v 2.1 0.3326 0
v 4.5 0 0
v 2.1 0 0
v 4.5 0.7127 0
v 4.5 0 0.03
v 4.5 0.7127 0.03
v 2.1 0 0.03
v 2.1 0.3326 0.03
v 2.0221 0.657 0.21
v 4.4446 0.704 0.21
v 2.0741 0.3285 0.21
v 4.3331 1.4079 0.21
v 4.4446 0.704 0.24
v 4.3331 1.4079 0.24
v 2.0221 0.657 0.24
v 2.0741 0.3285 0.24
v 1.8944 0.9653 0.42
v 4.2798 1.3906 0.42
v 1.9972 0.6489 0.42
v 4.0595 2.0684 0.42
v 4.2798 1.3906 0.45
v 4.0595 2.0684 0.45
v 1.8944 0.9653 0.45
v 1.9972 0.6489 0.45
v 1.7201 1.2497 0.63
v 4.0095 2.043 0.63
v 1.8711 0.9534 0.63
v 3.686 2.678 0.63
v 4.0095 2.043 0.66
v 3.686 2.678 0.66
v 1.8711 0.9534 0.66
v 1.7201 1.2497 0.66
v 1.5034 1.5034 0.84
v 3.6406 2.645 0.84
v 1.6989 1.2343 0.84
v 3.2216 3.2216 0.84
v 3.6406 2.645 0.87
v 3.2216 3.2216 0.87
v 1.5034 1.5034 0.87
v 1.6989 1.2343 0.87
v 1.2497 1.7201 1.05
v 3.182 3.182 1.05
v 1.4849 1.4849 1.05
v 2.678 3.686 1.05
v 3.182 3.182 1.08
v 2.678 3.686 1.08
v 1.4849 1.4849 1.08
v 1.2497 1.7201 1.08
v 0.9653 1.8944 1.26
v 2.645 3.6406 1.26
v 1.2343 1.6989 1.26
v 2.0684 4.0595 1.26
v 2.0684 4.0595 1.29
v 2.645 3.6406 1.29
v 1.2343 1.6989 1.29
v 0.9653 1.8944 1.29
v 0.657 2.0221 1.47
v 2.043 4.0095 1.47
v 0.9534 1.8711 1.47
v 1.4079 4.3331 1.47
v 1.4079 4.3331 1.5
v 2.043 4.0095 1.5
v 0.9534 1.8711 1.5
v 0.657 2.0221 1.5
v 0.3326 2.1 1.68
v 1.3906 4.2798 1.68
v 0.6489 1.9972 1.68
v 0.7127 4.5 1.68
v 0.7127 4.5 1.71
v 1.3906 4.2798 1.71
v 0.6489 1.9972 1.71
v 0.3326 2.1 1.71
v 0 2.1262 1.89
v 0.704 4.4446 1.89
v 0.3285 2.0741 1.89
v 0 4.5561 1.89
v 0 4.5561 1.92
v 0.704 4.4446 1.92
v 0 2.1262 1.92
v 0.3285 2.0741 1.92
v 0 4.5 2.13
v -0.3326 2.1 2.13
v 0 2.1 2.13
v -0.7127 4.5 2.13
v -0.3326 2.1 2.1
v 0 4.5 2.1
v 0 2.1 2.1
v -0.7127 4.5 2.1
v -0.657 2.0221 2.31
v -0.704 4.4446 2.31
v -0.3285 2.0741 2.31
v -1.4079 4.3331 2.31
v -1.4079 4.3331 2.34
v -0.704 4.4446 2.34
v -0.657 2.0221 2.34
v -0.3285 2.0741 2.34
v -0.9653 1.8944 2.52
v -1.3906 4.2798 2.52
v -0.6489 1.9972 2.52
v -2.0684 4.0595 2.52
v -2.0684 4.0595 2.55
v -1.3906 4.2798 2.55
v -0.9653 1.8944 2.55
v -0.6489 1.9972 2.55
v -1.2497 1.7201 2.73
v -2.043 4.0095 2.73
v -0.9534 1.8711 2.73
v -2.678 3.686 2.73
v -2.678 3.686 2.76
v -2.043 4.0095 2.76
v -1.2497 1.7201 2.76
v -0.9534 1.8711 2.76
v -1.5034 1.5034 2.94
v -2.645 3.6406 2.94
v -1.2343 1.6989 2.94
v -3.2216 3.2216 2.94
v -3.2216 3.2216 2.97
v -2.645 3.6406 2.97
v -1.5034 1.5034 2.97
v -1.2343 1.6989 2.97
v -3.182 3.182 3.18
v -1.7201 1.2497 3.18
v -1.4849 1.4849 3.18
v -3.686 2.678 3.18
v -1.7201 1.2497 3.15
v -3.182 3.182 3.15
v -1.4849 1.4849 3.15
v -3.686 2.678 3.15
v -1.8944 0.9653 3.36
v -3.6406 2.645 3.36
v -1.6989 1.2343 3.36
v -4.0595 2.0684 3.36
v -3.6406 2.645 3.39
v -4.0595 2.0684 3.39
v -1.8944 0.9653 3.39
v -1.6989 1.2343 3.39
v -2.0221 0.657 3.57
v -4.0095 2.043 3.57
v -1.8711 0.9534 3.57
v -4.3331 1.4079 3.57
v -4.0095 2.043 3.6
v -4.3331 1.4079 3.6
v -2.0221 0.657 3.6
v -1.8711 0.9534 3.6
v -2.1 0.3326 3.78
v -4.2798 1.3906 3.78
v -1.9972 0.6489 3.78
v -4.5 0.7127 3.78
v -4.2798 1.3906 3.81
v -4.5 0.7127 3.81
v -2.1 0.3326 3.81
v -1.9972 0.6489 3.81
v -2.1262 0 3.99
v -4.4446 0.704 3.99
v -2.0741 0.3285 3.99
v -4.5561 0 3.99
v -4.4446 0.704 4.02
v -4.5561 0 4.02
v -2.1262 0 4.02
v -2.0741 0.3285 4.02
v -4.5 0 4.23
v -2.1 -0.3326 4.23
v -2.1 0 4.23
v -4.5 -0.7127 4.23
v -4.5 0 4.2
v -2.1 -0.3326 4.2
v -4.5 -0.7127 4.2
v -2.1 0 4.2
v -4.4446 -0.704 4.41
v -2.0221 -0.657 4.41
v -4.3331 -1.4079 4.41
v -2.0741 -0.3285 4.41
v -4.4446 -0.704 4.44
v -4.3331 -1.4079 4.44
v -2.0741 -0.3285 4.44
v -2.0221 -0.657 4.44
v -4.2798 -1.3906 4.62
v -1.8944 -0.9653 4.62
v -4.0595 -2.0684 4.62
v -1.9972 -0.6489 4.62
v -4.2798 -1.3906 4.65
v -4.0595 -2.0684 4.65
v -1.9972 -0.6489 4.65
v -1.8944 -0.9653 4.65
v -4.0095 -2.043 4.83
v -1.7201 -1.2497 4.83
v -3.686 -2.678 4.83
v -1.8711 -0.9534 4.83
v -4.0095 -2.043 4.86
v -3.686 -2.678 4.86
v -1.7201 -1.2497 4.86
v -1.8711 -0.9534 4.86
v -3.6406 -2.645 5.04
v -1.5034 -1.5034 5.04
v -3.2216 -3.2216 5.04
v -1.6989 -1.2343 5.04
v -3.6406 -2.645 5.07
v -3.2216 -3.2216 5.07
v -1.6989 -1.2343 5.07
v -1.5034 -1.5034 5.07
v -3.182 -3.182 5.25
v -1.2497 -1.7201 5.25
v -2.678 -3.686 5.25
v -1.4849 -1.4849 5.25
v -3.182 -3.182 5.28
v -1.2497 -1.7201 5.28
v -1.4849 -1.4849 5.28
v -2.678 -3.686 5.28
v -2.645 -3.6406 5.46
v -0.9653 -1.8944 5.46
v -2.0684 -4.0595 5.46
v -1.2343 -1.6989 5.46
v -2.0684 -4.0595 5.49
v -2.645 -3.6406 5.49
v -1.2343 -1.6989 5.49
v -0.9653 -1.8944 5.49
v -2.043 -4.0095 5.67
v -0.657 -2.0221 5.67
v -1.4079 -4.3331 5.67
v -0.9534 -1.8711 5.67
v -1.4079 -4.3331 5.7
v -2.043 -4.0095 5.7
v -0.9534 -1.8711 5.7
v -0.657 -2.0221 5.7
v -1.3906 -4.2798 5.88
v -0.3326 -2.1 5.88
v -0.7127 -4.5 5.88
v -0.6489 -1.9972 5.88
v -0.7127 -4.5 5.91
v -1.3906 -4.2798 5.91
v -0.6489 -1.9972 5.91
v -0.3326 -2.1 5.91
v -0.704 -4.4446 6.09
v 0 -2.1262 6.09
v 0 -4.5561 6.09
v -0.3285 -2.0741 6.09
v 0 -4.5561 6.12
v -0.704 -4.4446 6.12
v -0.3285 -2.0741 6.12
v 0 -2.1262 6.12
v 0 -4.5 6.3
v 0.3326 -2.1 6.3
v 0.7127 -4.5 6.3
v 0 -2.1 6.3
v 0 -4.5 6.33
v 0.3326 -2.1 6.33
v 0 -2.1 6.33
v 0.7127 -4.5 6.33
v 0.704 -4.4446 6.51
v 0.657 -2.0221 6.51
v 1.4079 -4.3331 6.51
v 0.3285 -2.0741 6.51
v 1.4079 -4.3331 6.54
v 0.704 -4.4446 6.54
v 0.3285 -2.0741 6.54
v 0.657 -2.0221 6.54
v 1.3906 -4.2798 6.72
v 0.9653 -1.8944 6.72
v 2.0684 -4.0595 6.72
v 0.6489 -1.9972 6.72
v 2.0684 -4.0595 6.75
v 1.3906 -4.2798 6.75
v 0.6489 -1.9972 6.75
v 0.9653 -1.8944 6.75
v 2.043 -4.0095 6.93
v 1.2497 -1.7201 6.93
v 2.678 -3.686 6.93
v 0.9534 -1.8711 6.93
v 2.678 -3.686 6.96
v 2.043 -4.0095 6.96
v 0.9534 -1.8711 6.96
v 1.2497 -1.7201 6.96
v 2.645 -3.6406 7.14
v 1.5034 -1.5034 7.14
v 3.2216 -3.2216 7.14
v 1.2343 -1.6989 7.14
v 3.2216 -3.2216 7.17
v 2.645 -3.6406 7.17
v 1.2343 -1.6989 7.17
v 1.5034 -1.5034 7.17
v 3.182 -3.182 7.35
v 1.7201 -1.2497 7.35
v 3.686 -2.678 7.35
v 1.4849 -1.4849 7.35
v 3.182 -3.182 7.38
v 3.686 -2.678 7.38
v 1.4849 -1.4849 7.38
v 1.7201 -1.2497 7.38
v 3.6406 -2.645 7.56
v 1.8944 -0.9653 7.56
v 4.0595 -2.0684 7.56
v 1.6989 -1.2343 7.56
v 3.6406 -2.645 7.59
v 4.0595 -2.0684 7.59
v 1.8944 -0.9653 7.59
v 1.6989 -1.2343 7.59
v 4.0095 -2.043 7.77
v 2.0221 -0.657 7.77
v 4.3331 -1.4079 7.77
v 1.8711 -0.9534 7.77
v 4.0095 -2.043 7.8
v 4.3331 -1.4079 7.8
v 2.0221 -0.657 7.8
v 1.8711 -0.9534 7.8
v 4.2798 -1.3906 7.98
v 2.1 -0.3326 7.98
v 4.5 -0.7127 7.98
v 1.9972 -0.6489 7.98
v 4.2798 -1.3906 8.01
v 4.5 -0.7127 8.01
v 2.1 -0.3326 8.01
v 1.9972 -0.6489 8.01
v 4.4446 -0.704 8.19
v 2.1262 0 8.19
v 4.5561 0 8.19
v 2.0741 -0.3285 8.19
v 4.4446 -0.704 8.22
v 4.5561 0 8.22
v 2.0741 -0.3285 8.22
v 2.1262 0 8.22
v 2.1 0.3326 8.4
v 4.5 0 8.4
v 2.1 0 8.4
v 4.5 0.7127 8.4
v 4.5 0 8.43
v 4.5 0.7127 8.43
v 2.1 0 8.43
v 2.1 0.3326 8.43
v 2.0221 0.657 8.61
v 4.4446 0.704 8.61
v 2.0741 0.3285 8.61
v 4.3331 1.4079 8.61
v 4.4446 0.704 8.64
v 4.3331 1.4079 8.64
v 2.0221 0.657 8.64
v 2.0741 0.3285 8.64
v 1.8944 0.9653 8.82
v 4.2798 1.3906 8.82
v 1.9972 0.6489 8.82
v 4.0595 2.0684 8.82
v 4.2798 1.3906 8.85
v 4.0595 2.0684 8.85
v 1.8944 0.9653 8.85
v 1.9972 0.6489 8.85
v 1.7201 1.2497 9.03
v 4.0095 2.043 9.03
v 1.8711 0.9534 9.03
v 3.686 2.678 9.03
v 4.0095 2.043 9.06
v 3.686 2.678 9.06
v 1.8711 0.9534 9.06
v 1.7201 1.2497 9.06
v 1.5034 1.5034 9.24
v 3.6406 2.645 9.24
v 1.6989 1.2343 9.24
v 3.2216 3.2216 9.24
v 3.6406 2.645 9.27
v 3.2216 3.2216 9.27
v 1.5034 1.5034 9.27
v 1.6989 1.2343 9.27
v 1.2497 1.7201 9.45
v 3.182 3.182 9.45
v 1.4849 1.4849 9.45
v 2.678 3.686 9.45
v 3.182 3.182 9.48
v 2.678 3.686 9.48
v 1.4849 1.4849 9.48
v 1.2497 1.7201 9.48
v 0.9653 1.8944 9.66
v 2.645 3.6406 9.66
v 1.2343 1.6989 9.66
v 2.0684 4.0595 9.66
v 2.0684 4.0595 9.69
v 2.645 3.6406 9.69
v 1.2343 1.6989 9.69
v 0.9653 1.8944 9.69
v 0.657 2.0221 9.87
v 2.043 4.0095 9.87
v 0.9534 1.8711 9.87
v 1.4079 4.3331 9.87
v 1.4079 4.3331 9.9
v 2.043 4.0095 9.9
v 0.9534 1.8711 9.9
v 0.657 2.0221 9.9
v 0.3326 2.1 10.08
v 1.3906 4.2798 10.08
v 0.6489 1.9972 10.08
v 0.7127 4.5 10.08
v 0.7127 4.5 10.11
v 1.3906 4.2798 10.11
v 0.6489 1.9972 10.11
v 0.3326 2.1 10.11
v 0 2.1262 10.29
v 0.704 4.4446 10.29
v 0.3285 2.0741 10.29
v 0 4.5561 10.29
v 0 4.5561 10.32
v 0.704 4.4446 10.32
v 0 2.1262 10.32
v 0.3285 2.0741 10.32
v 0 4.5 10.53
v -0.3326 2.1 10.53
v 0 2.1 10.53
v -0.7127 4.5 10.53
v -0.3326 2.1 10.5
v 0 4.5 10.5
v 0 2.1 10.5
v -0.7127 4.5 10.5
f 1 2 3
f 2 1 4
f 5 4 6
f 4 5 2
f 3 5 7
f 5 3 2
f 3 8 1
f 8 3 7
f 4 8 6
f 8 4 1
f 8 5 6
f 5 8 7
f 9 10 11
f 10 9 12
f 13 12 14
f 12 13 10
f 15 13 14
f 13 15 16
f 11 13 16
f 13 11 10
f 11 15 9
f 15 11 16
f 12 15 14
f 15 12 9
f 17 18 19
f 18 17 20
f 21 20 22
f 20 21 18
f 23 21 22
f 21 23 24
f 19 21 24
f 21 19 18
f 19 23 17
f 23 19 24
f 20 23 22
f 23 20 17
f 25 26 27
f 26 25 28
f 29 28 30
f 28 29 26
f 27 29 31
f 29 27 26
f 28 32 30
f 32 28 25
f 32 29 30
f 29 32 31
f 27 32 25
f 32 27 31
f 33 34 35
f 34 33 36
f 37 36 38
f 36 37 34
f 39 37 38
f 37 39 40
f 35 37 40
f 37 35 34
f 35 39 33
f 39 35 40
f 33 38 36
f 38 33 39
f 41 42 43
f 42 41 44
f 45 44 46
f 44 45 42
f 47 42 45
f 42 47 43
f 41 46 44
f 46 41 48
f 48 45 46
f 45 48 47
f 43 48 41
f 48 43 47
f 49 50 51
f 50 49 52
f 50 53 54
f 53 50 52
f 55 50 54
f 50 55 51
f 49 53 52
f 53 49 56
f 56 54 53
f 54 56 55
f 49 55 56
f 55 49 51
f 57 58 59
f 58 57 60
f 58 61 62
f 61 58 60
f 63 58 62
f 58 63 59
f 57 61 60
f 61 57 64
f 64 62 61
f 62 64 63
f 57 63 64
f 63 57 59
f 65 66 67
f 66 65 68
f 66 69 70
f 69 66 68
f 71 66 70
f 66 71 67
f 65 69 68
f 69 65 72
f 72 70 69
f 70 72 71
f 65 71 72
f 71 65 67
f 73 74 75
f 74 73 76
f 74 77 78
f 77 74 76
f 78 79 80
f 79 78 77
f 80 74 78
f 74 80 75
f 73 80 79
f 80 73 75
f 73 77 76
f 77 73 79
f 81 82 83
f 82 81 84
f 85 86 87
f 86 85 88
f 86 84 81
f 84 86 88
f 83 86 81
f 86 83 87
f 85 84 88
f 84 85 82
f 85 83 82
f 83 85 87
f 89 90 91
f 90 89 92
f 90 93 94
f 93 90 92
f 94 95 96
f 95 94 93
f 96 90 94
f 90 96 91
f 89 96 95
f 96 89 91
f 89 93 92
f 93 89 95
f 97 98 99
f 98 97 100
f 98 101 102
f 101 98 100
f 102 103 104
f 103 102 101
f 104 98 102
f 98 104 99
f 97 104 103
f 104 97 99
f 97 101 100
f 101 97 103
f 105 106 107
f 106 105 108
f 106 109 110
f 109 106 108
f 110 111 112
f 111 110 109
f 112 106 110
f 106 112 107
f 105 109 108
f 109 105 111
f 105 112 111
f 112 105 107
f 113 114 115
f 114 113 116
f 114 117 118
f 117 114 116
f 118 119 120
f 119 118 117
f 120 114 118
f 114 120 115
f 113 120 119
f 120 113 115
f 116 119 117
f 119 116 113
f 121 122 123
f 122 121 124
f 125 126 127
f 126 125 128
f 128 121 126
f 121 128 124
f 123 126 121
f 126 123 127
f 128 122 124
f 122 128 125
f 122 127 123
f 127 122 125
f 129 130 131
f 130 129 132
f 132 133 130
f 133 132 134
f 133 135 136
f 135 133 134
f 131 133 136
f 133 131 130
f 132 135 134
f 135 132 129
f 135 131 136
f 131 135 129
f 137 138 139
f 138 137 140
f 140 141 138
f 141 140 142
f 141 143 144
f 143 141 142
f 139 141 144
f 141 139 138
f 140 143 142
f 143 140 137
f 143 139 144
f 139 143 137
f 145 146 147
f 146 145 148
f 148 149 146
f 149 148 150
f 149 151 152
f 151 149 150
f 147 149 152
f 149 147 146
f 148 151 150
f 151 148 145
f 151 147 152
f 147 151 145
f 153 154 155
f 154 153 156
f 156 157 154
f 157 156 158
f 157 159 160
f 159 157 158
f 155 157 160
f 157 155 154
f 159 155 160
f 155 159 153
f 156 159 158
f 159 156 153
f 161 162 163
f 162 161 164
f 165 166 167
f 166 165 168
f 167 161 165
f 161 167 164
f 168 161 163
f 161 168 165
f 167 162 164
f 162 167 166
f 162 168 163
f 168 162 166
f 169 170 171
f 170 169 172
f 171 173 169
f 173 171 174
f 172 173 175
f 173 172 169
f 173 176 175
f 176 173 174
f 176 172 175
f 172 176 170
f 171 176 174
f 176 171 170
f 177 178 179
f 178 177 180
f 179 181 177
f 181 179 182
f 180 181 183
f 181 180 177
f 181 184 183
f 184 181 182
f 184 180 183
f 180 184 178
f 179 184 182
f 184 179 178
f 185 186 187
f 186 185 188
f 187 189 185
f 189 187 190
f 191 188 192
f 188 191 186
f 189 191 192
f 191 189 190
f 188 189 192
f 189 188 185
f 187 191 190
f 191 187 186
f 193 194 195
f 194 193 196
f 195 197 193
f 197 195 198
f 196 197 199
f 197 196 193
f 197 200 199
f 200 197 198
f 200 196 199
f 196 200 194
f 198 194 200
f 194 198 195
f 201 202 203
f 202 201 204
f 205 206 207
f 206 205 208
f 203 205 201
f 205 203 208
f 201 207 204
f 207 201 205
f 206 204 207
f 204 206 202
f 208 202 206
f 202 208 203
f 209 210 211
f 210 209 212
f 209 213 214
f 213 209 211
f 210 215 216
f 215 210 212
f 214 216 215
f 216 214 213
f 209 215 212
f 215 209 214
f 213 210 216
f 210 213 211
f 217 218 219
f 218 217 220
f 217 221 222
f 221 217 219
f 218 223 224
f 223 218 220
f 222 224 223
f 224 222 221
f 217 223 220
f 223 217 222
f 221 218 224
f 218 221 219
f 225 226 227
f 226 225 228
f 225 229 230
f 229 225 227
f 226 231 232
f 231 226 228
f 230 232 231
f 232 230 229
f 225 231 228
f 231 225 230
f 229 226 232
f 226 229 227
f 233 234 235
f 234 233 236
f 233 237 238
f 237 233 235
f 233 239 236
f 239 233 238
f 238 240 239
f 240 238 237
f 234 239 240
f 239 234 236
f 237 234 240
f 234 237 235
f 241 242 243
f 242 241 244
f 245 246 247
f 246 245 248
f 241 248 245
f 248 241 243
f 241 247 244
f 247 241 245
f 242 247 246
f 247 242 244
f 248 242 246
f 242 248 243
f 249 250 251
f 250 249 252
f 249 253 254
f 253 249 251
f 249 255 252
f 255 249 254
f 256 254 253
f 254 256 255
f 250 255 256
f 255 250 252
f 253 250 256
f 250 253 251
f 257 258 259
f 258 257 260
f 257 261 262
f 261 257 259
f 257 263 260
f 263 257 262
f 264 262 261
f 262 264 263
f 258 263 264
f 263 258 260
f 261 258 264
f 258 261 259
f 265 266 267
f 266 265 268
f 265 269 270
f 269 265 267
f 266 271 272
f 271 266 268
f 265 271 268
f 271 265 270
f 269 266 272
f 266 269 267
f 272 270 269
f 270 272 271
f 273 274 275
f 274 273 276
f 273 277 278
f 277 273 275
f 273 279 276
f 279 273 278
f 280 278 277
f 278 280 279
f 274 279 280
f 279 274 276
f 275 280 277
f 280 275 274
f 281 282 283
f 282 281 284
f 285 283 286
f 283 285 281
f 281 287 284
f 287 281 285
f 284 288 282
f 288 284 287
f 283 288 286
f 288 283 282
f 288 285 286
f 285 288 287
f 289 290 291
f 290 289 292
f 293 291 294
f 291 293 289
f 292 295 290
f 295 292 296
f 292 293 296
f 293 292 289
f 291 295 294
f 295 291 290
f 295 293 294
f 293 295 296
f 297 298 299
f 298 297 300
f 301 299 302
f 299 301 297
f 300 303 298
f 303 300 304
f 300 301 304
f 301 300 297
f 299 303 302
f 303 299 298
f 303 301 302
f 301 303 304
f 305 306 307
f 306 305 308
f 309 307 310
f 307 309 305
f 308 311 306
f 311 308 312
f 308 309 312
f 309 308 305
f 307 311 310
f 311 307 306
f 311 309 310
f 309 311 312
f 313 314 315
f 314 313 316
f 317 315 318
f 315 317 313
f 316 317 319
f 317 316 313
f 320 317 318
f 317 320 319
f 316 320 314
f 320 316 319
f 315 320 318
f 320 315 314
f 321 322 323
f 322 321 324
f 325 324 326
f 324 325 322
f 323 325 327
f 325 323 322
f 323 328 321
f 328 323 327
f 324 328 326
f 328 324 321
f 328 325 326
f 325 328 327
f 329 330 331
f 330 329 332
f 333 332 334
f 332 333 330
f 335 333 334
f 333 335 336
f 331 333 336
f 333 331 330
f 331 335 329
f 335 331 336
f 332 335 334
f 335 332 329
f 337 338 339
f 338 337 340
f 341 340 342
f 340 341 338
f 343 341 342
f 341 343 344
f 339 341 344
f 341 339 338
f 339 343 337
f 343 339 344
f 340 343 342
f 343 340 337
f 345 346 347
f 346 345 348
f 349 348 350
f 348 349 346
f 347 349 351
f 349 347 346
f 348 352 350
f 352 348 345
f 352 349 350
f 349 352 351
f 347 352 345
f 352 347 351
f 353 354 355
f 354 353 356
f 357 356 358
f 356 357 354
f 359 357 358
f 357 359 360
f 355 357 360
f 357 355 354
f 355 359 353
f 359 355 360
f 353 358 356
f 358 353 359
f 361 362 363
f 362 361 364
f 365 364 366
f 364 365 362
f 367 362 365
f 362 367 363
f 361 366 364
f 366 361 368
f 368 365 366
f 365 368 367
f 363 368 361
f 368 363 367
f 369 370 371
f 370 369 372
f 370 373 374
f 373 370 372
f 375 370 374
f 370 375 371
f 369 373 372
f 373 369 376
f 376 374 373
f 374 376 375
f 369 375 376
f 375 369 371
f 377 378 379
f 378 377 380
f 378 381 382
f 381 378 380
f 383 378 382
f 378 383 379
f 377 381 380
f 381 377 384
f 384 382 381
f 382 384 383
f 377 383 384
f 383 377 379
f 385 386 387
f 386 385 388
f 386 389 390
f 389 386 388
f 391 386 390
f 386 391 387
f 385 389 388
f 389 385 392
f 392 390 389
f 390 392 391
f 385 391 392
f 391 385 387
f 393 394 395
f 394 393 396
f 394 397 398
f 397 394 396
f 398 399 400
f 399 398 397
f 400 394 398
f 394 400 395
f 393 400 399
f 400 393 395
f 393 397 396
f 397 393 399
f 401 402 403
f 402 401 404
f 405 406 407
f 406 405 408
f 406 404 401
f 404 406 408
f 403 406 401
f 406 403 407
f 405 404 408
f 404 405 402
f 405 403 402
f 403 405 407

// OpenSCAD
include <affine.scad>

//// Module constructed from affine aRpp to rotate about line through two points.
module rotatepp(angle,p1,p2)
{
    arot = aRpp(angle,p1,p2);
    apply(arot) children();
}

//// Module constructed from affine aMpp to mirror about plane
//// everywhere orthogonal to vector p2-p1 through p1.
module mirrorpp(p1,p2)
{
    amirror = aMpp(p1,p2);
    apply(amirror) children();
}

////Builds one step of a stair for test1
module stair(depth,incAngle,rin,rout)
{
   cas = tan(incAngle);
   linear_extrude(height=depth){ polygon([[rin,0],[rin,cas*rin],[rout,cas*rout],[rout,0]]); }
}

//// Set only one test to true or get ugly results
test1=true;
test2=false;
test3=false;
test4=false;
test5=false;

//// Some values for tests
origin = [0,0,0];
v1 = [1,1,1];
v2 = [2,2,2];
v3 = [0,0,3];
v11=[-4,2,7];
v22=[-1,-3,-1];


if(test1)
{
//// TEST1 affine power.  affine times affine
   //// Stair case   
   rin = 2.1;
   rout = 4.5;
   depth = .03;
   rise = .21;
   totalAngle = 450;
   numberStairs = 50;
   incAngle=totalAngle/numberStairs;
   totalAffine = aXa(aS(off=[0,0,rise]),aRv(-incAngle,[0,0,1]));
   for(i=[0:numberStairs])
   {
     apply(aPow(totalAffine,i)) stair(depth,incAngle,rin,rout);
   }  
}   


if(test2)
{
//// TEST 2.  Print out 4 rotations.  Last should be equal to first (its close!)
rot = aRpp(90,v3,v2);
echo([rot,aPow(rot,1),aPow(rot,2),aPow(rot,3),aPow(rot,4)]);
}
   
if(test3)
{    
   //// This shows that the modules above for rotate and mirror work
   ///Draw cylinder through v3, v2 to show axis of rotation.
    hull() {translate(v2) sphere(.2); translate(v3) sphere(.2);}

   ///Draw rect solid
   cube([.5,2,3]);
   /// Draw rotated solid about v2,v3
   rotatepp(165,v3,v2) cube([.5,2,3]);
   /// Draw mirrored on plane through v3
   mirrorpp(v3,v2) rotatepp(165,v3,v2)  cube([.5,2,3]);
}

if(test4)
{
   //// Generates the same as the above using affines directly
   ///Draw cylinder through v3, v2 to show axis of rotation.
    hull() {translate(v2) sphere(.2); translate(v3) sphere(.2);}

   ///Affine to rotate as above
   rot = aRpp(165,v3,v2);
   //Affine to mirror as above
   mir = aMpp(v3,v2);
   ///combined mirror rotate
   mrt = aXa(mir,rot); //really wish we overloaded '*' here

   cube([.5,2,3]);
   apply(rot) cube([.5,2,3]);
   apply(mrt) cube([.5,2,3]); //We used a cube to distinguish from solid.
}

if(test5)
{
///////////////// Miscelaneous test data from original debugs
///////////////// Both printed and displayed.    
   echo("\n  TEST VARIABLES "); 
   testM3 = [[2,3,4],[-2,5,7],[.1,-3,6]];
   testM2 = [[2,3],[-2,5]];
   testV = [-1,2,-3];
   echo("testM3 = [[2,3,4],[-2,5,7],[.1,-3,6]];");
   echo("testM2 = [[2,3],[-2,5]];"); 
   echo("testV = [-1,2,-3];");  
    
   echo("\n  TEST 22 matrix inverses");
   echo("mI(testM2) =", mI(testM2)); 
   echo("mI(testM3) =", mI(testM3));
   echo("testM3 * mI(testM3) =", testM3 * mI(testM3)); 
    
   echo("\n  TEST 4444 matrix transpose"); 
   echo("mT(testM2) =",mT(testM2));
   echo("mT(testM3) =",mT(testM3));
   
   echo("\n  MORE TEST VARIABLES "); 
   testM4 = [[2,3,4,-1],[-2,5,7,2],[.1,-3,6,0],[0,0,0,1]];
   echo("testM4 = [[2,3,4,-1],[-2,5,7,2],[.1,-3,6,0,-3],[0,0,0,1]];");
   
   echo("\n  55555 affine form from transform matrix and back");
   echo("aDm(testM4) =",aDm(testM4));
   echo("mDa(aDm(testM4)) =",mDa(aDm(testM4)));
   echo("aDm(testM4) =",aDm(testM4));
   echo("mDa(aDm(testM4)) =",mDa(aDm(testM4)));
   
   echo("\n  666666 affine times a vector");
   echo("aXv(aDm(testM4),testV) =",aXv(aDm(testM4),testV));
   echo("aXv(aDm(testM4),testV) =",aXv(aDm(testM4),testV));
   
   echo("\n  7777777 affine inverse returns original vector");
   echo("aXv(aI(aDm(testM4),testV),aXv(aDm(testM4),testV)) =",
         aXv(aI(aDm(testM4),testV),aXv(aDm(testM4),testV)));
   echo("aXv(aI(aDm(testM4),testV),aXv(aDm(testM4),testV)) =",
         aXv(aI(aDm(testM4),testV),aXv(aDm(testM4),testV)));  
     
   echo("\n  88888888 affine generator functions");
   echo("arxy(45) =", arxy(45));
   echo("aDpppp([[1,5,1],[0,.5,2],[2,1,2]],[1,1,1]) =",
         aDpppp([[1,5,1],[0,.5,2],[2,1,2]],[1,1,1]));
   echo("aRv(90,[1,1,3]) =", aRv(90,[1,1,3]));      
        
 
   echo("\n\n\n");

//// test aRpp
$fn=31;
angle=190;
twi = 125;

hull()
{translate(v11) sphere(.2); translate(v22) sphere(.2);}

//translate(-v11) hull()
//{translate(v11) sphere(.2); translate(v22) sphere(.2);}

myrot = aRpp(angle,v11,v22);

for( i=[0:60:angle] )
{  
apply (aMpp(v11,v22))    
apply(aRpp(i,v11,v22)) translate([0,1,4])
   linear_extrude(height=3,center=true, twist=twi)
   { polygon([[0,0],[0,1],[4,0]]); }
   
 apply(aRpp(i,v11,v22)) translate([0,1,4])
   linear_extrude(height=3,center=true, twist=twi)
   { polygon([[0,0],[0,1],[4,0]]); }  
}
translate([0,1,4]) linear_extrude(height=3,center=true, twist=twi)
  { polygon([[0,0],[0,1],[4,0]]); }
  
  
} 

/*
Observations::
We can multiply any number of affines together to get a new affine.
Applying these to a shape is more efficient that using multiple transforms from
modules.

An affine moves us from one coordinate system to another, as do the built in
transformations,  The new coordinate system can be rotated, mirrored or distorted both
angularly and stretched on any axis.

The inverse of an affine moves a point, or object back to the original
coordinate system it was called from.
*/
